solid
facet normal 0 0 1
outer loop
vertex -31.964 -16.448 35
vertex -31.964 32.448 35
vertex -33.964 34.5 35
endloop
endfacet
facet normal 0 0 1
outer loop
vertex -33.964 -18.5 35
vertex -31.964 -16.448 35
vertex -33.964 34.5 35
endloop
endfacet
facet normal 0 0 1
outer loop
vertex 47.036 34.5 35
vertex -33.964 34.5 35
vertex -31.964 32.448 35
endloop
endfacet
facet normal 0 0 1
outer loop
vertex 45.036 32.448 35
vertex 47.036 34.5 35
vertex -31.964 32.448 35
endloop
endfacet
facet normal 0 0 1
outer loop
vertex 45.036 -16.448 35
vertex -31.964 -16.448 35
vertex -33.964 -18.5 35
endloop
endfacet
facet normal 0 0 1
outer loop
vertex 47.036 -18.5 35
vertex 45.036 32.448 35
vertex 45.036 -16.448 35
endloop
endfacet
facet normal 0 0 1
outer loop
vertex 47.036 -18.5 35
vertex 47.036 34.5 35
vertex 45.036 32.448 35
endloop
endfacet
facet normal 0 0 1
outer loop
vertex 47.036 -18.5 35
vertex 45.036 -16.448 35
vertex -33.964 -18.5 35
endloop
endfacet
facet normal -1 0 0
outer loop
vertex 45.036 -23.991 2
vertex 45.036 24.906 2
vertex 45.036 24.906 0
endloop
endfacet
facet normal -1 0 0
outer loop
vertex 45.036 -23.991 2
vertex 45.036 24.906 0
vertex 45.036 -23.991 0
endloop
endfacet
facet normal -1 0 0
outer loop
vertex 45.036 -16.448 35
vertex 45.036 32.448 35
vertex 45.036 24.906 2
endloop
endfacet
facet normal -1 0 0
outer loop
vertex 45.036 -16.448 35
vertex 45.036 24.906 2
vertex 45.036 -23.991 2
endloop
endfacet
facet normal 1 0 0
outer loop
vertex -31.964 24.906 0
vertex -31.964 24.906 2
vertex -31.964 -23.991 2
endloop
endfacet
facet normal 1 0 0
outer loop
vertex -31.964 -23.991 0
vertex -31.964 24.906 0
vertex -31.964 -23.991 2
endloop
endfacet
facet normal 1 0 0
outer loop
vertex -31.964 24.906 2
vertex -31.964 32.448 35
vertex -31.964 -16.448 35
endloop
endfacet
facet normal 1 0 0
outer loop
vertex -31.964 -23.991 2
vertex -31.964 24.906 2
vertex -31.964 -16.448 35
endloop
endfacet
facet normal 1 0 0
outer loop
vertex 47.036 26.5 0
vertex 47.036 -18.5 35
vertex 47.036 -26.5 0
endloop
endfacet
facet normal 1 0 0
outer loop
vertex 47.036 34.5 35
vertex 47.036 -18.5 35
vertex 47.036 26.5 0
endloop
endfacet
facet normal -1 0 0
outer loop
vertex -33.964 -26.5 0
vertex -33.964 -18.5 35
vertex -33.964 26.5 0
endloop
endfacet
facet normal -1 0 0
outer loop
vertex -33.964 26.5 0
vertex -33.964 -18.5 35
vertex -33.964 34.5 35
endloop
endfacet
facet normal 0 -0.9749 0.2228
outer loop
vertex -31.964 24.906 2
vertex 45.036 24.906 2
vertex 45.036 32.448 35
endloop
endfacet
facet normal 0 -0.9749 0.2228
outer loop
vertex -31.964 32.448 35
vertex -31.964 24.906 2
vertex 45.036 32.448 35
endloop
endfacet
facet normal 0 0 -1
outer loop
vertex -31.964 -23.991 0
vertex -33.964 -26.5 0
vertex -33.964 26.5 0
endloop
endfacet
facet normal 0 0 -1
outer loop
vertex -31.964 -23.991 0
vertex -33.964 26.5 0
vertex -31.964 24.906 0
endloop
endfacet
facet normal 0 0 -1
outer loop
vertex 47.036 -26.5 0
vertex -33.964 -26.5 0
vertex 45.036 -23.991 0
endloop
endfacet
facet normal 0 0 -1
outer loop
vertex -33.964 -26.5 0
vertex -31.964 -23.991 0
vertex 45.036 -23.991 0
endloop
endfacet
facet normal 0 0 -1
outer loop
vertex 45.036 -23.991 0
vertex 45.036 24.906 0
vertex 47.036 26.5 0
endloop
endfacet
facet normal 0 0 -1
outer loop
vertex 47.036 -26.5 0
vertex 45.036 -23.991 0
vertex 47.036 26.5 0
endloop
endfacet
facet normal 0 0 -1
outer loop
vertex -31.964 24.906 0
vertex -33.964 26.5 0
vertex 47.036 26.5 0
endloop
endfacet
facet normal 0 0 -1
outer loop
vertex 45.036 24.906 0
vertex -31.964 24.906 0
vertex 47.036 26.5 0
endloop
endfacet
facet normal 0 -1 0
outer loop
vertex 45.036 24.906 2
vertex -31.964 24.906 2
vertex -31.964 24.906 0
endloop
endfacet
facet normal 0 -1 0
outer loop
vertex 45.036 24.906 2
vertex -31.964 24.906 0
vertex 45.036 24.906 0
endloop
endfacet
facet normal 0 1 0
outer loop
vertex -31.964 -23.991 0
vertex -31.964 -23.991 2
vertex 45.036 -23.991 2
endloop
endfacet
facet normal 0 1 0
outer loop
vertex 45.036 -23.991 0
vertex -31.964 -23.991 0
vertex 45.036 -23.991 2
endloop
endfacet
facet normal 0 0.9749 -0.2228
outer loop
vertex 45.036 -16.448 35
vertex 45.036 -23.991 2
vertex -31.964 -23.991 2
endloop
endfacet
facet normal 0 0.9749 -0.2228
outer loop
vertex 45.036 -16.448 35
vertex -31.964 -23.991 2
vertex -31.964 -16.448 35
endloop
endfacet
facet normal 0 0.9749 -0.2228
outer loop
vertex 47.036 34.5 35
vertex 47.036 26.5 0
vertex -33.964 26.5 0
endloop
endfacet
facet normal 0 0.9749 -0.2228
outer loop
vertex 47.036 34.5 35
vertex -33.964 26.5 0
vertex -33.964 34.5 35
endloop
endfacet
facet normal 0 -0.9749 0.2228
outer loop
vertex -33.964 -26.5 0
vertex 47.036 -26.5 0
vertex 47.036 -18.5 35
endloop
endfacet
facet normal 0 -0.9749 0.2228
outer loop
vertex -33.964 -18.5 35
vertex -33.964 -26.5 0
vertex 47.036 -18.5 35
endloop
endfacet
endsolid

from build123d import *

# Parameters (mm, degrees)
F0_W     = 81
F0_H     = 53
F1_DEPTH = 35
F3_DEPTH = 81
F4_DEPTH = 81.001
F5_T     = -2
F6_DEPTH = 25


with BuildPart() as f1:
    # F0 (on Top) → F1 (new body)
    with BuildSketch(Plane.XY):
        with Locations((6.5364544774, 0)):
            Rectangle(F0_W, F0_H)
    extrude(amount=F1_DEPTH)

    # F2 (on face) → F3 (join, through all)
    with BuildSketch(Plane.YZ.offset(47.0364544774)):
        Polygon((26.5, 35), (26.5, 0), (34.5, 35), align=None)
    extrude(amount=-F3_DEPTH)

    # F2 (on face) → F4 (cut, through all)
    with BuildSketch(Plane.YZ.offset(47.0364544774)):
        Polygon((-26.5, 35), (-26.5, 0), (-18.5, 35), align=None)
    extrude(amount=-F4_DEPTH, mode=Mode.SUBTRACT)

    # F5
    f5_openings = [f1.faces().sort_by_distance(p)[0] for p in [
        (6.536454, 8, 35),
    ]]
    offset(amount=F5_T, openings=f5_openings)

    # F6 (cut): a face of the model
    f6_faces = [f1.faces().sort_by_distance(p)[0] for p in [
        (6.5364544774, 0.4571428571, 2),
    ]]
    extrude(f6_faces, amount=-F6_DEPTH, mode=Mode.SUBTRACT)


solid = f1.part
